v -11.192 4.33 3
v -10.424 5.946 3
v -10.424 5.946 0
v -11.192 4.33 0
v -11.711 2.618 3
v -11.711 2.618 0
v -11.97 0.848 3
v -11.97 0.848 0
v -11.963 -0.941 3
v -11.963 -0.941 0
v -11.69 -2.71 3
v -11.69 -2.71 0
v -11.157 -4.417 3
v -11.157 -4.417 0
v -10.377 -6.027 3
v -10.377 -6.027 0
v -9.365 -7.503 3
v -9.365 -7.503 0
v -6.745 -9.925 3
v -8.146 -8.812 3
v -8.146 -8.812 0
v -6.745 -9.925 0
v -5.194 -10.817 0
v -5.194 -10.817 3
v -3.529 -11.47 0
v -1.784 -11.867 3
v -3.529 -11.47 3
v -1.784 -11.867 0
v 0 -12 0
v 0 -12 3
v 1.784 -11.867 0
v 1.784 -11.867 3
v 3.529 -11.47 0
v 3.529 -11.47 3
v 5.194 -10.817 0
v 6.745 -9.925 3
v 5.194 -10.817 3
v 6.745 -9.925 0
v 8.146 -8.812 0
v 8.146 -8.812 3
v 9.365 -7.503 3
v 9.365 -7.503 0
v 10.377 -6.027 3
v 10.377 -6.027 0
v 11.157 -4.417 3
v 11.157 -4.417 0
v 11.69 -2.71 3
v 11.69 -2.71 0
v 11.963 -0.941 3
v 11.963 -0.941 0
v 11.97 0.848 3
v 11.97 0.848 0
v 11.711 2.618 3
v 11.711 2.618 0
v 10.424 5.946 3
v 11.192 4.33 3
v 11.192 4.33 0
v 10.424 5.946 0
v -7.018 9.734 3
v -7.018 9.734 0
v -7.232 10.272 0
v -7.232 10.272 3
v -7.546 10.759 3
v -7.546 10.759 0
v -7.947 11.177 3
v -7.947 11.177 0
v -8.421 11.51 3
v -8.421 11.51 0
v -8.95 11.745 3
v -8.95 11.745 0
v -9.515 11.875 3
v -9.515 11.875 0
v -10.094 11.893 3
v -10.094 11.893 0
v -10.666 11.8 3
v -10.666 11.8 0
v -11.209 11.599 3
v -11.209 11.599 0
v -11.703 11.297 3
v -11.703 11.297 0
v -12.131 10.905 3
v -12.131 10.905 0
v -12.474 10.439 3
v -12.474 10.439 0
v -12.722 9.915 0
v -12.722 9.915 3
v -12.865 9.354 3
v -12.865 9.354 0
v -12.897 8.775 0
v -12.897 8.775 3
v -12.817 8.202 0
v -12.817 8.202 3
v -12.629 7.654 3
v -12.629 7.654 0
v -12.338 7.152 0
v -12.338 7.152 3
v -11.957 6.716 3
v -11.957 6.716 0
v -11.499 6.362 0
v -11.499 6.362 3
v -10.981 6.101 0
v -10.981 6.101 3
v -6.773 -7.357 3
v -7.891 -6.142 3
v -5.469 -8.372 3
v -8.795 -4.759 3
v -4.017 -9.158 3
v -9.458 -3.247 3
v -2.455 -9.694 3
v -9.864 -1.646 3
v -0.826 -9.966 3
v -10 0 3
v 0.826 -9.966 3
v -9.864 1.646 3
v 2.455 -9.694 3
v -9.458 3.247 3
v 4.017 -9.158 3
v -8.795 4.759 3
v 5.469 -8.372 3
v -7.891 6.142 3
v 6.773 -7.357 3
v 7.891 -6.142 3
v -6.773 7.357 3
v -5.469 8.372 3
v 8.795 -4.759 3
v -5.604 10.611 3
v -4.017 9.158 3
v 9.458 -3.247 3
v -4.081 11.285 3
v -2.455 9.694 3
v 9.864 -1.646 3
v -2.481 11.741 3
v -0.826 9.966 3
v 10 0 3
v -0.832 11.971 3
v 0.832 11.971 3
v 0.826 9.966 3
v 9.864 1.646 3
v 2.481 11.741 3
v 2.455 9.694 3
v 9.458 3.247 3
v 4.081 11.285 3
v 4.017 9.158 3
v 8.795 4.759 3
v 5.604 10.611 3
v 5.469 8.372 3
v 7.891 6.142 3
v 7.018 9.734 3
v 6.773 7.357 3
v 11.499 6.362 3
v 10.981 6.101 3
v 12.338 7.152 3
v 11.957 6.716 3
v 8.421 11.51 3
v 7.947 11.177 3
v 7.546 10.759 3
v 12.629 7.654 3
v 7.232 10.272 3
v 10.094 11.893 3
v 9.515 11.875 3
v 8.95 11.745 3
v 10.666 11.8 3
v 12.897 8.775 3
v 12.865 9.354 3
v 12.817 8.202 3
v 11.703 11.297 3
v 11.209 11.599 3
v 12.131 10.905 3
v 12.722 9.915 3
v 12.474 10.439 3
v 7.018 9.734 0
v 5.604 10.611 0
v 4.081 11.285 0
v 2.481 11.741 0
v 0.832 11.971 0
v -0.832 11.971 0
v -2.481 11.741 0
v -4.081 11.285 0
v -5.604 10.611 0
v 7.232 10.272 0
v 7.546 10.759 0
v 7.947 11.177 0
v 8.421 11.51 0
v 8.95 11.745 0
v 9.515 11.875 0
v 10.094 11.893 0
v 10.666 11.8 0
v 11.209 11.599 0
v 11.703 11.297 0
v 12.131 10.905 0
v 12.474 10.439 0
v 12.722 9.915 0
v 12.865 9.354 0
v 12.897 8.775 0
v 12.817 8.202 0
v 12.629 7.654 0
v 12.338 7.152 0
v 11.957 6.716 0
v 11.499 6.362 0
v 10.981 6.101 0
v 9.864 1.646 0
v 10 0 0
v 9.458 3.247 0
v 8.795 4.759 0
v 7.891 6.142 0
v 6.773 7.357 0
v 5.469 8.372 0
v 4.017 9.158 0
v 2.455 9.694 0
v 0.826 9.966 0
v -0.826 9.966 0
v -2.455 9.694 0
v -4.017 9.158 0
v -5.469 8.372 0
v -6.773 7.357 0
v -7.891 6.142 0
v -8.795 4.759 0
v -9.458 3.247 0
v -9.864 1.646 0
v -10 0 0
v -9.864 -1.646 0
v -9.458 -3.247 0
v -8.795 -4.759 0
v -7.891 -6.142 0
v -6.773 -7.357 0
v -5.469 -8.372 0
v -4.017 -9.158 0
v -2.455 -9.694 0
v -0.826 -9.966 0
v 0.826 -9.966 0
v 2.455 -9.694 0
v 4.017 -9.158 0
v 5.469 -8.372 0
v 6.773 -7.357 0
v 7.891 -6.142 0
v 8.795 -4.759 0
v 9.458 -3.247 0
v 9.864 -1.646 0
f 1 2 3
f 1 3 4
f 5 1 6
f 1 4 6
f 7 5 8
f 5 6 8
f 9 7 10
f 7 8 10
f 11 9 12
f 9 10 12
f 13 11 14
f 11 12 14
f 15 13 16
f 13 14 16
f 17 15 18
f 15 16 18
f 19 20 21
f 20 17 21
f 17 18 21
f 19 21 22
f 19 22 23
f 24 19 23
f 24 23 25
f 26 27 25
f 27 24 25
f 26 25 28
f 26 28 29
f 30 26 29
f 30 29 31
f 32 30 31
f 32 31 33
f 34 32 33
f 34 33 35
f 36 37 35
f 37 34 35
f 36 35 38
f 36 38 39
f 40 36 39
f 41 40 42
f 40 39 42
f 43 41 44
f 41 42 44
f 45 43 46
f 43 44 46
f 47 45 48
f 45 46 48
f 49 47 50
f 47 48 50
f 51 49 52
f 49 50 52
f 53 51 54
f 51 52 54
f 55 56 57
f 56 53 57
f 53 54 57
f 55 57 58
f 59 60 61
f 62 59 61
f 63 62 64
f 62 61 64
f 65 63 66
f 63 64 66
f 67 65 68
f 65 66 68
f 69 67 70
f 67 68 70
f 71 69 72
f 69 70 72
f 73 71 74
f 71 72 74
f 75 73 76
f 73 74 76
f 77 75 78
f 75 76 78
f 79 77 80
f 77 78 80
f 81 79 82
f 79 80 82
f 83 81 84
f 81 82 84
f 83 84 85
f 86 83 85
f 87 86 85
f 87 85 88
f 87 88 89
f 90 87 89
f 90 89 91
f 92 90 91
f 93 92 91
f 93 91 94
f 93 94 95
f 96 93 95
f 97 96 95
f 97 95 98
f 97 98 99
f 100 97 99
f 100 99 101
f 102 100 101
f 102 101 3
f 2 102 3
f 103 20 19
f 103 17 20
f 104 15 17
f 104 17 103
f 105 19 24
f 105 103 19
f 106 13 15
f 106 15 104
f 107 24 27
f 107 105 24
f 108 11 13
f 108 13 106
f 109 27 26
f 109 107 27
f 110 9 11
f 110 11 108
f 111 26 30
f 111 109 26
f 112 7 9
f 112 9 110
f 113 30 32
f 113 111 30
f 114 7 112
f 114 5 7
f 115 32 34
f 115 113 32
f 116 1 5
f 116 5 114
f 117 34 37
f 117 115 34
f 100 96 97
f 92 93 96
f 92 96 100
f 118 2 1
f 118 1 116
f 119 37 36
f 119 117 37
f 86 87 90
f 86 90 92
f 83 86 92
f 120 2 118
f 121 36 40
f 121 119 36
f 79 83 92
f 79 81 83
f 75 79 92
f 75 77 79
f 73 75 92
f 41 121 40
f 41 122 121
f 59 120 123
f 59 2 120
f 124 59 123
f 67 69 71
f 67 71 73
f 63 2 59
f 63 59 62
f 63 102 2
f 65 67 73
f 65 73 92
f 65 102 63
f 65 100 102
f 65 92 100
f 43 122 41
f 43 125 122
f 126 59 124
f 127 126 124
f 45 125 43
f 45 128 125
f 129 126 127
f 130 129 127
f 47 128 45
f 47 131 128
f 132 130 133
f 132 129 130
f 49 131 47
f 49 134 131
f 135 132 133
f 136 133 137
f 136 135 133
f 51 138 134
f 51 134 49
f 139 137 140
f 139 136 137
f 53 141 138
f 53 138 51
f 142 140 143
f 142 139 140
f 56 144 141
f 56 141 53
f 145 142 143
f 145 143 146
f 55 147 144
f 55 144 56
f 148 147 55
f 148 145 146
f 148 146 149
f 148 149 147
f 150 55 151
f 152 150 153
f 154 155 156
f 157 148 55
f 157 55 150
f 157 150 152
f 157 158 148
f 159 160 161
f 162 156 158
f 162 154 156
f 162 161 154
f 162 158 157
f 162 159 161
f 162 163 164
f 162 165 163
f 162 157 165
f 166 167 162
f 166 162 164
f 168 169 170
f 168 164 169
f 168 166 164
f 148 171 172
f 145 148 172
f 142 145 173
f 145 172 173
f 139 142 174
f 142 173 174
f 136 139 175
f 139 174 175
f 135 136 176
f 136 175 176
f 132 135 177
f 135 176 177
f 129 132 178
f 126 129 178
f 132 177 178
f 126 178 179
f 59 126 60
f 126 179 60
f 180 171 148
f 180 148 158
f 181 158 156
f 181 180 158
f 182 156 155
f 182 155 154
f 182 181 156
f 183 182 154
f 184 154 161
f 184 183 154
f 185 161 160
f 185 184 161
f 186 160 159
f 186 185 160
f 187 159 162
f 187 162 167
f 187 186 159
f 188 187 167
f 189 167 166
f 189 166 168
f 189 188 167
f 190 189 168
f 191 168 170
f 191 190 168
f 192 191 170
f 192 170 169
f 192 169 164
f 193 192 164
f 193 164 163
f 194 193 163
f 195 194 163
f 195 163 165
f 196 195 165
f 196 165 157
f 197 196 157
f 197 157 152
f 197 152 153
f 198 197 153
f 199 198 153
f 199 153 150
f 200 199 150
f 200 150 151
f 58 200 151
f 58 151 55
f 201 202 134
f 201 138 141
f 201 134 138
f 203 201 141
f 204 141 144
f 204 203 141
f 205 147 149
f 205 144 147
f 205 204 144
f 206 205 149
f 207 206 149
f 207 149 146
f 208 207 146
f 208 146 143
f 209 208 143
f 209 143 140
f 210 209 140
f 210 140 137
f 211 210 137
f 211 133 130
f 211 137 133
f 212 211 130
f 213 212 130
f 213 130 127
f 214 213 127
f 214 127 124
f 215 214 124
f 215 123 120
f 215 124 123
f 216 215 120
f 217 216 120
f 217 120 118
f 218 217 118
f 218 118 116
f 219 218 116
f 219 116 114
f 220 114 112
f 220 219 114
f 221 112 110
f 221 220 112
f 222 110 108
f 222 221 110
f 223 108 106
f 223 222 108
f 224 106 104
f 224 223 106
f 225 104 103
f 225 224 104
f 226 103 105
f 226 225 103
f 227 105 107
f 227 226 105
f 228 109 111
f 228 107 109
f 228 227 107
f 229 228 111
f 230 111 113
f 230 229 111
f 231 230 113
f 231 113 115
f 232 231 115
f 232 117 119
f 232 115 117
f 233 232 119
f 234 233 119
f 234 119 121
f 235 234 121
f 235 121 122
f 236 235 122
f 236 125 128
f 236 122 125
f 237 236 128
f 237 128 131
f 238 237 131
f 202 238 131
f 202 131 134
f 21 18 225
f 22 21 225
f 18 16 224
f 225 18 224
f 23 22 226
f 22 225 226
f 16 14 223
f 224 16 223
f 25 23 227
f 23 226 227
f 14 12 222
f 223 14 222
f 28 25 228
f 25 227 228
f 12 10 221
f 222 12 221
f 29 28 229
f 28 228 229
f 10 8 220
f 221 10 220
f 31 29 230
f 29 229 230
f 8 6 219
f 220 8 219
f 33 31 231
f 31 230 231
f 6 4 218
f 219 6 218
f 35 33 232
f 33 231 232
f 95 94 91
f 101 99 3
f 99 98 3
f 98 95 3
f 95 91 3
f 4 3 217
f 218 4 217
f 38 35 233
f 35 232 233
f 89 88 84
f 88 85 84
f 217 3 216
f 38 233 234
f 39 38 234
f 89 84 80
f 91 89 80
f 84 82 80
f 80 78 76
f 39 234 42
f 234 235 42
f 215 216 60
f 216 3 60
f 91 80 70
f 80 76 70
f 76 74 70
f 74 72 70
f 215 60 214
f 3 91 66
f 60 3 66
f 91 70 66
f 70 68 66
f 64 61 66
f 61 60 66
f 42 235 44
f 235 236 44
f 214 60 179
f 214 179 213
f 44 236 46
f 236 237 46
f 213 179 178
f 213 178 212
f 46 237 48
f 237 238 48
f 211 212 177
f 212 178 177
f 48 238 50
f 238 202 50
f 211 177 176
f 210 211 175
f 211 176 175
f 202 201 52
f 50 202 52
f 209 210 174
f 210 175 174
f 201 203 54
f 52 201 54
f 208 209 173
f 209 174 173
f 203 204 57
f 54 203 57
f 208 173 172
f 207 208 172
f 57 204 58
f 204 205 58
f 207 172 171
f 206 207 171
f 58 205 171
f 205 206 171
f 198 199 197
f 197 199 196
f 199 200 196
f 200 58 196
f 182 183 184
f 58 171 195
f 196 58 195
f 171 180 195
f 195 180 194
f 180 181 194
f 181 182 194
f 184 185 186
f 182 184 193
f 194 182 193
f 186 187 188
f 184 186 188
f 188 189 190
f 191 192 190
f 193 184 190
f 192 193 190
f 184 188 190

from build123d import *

# Parameters (mm, degrees)
CYLINDER002_R               = 10
CYLINDER002_DEPTH           = 10
CYLINDER001_R               = 3
CYLINDER001_DEPTH           = 3
CYLINDER001_PLACEMENT_ANGLE = 45
CYLINDER_R                  = 12
CYLINDER_DEPTH              = 3


with BuildPart() as hole:
    # Cylinder002 → Cylinder002 (new body)
    with BuildSketch(Plane.XY.offset(-4)):
        Circle(CYLINDER002_R)
    extrude(amount=CYLINDER002_DEPTH)


with BuildPart() as left_ear:
    # Cylinder001 → Cylinder001 (new body)
    with BuildSketch(Plane.XY):
        Circle(CYLINDER001_R)
    extrude(amount=CYLINDER001_DEPTH)


with BuildPart() as left_ear_1:
    # Cylinder001 placement: moved
    add(left_ear.part.moved(Location((-9.899495, 8.899495, 0))).rotate(Axis((-9.899495, 8.899495, 0), (0, 0, 1)), CYLINDER001_PLACEMENT_ANGLE))


with BuildPart() as right_ear:
    # Part__Mirroring: instance of left-ear
    add(left_ear_1.part.mirror(Plane(origin=(0, 0, 0), x_dir=(0, -1, 0), z_dir=(1, 0, 0))))


with BuildPart() as base_cylinder:
    # Cylinder → Cylinder (new body)
    with BuildSketch(Plane.XY):
        Circle(CYLINDER_R)
    extrude(amount=CYLINDER_DEPTH)


with BuildPart() as ring_with_ears:
    # Fusion base: copy of left-ear
    add(left_ear_1.part)

    # Fusion: union right-ear, base-cylinder
    add(right_ear.part)
    add(base_cylinder.part)

    # Cut: cut hole
    add(hole.part, mode=Mode.SUBTRACT)


solid = ring_with_ears.part
